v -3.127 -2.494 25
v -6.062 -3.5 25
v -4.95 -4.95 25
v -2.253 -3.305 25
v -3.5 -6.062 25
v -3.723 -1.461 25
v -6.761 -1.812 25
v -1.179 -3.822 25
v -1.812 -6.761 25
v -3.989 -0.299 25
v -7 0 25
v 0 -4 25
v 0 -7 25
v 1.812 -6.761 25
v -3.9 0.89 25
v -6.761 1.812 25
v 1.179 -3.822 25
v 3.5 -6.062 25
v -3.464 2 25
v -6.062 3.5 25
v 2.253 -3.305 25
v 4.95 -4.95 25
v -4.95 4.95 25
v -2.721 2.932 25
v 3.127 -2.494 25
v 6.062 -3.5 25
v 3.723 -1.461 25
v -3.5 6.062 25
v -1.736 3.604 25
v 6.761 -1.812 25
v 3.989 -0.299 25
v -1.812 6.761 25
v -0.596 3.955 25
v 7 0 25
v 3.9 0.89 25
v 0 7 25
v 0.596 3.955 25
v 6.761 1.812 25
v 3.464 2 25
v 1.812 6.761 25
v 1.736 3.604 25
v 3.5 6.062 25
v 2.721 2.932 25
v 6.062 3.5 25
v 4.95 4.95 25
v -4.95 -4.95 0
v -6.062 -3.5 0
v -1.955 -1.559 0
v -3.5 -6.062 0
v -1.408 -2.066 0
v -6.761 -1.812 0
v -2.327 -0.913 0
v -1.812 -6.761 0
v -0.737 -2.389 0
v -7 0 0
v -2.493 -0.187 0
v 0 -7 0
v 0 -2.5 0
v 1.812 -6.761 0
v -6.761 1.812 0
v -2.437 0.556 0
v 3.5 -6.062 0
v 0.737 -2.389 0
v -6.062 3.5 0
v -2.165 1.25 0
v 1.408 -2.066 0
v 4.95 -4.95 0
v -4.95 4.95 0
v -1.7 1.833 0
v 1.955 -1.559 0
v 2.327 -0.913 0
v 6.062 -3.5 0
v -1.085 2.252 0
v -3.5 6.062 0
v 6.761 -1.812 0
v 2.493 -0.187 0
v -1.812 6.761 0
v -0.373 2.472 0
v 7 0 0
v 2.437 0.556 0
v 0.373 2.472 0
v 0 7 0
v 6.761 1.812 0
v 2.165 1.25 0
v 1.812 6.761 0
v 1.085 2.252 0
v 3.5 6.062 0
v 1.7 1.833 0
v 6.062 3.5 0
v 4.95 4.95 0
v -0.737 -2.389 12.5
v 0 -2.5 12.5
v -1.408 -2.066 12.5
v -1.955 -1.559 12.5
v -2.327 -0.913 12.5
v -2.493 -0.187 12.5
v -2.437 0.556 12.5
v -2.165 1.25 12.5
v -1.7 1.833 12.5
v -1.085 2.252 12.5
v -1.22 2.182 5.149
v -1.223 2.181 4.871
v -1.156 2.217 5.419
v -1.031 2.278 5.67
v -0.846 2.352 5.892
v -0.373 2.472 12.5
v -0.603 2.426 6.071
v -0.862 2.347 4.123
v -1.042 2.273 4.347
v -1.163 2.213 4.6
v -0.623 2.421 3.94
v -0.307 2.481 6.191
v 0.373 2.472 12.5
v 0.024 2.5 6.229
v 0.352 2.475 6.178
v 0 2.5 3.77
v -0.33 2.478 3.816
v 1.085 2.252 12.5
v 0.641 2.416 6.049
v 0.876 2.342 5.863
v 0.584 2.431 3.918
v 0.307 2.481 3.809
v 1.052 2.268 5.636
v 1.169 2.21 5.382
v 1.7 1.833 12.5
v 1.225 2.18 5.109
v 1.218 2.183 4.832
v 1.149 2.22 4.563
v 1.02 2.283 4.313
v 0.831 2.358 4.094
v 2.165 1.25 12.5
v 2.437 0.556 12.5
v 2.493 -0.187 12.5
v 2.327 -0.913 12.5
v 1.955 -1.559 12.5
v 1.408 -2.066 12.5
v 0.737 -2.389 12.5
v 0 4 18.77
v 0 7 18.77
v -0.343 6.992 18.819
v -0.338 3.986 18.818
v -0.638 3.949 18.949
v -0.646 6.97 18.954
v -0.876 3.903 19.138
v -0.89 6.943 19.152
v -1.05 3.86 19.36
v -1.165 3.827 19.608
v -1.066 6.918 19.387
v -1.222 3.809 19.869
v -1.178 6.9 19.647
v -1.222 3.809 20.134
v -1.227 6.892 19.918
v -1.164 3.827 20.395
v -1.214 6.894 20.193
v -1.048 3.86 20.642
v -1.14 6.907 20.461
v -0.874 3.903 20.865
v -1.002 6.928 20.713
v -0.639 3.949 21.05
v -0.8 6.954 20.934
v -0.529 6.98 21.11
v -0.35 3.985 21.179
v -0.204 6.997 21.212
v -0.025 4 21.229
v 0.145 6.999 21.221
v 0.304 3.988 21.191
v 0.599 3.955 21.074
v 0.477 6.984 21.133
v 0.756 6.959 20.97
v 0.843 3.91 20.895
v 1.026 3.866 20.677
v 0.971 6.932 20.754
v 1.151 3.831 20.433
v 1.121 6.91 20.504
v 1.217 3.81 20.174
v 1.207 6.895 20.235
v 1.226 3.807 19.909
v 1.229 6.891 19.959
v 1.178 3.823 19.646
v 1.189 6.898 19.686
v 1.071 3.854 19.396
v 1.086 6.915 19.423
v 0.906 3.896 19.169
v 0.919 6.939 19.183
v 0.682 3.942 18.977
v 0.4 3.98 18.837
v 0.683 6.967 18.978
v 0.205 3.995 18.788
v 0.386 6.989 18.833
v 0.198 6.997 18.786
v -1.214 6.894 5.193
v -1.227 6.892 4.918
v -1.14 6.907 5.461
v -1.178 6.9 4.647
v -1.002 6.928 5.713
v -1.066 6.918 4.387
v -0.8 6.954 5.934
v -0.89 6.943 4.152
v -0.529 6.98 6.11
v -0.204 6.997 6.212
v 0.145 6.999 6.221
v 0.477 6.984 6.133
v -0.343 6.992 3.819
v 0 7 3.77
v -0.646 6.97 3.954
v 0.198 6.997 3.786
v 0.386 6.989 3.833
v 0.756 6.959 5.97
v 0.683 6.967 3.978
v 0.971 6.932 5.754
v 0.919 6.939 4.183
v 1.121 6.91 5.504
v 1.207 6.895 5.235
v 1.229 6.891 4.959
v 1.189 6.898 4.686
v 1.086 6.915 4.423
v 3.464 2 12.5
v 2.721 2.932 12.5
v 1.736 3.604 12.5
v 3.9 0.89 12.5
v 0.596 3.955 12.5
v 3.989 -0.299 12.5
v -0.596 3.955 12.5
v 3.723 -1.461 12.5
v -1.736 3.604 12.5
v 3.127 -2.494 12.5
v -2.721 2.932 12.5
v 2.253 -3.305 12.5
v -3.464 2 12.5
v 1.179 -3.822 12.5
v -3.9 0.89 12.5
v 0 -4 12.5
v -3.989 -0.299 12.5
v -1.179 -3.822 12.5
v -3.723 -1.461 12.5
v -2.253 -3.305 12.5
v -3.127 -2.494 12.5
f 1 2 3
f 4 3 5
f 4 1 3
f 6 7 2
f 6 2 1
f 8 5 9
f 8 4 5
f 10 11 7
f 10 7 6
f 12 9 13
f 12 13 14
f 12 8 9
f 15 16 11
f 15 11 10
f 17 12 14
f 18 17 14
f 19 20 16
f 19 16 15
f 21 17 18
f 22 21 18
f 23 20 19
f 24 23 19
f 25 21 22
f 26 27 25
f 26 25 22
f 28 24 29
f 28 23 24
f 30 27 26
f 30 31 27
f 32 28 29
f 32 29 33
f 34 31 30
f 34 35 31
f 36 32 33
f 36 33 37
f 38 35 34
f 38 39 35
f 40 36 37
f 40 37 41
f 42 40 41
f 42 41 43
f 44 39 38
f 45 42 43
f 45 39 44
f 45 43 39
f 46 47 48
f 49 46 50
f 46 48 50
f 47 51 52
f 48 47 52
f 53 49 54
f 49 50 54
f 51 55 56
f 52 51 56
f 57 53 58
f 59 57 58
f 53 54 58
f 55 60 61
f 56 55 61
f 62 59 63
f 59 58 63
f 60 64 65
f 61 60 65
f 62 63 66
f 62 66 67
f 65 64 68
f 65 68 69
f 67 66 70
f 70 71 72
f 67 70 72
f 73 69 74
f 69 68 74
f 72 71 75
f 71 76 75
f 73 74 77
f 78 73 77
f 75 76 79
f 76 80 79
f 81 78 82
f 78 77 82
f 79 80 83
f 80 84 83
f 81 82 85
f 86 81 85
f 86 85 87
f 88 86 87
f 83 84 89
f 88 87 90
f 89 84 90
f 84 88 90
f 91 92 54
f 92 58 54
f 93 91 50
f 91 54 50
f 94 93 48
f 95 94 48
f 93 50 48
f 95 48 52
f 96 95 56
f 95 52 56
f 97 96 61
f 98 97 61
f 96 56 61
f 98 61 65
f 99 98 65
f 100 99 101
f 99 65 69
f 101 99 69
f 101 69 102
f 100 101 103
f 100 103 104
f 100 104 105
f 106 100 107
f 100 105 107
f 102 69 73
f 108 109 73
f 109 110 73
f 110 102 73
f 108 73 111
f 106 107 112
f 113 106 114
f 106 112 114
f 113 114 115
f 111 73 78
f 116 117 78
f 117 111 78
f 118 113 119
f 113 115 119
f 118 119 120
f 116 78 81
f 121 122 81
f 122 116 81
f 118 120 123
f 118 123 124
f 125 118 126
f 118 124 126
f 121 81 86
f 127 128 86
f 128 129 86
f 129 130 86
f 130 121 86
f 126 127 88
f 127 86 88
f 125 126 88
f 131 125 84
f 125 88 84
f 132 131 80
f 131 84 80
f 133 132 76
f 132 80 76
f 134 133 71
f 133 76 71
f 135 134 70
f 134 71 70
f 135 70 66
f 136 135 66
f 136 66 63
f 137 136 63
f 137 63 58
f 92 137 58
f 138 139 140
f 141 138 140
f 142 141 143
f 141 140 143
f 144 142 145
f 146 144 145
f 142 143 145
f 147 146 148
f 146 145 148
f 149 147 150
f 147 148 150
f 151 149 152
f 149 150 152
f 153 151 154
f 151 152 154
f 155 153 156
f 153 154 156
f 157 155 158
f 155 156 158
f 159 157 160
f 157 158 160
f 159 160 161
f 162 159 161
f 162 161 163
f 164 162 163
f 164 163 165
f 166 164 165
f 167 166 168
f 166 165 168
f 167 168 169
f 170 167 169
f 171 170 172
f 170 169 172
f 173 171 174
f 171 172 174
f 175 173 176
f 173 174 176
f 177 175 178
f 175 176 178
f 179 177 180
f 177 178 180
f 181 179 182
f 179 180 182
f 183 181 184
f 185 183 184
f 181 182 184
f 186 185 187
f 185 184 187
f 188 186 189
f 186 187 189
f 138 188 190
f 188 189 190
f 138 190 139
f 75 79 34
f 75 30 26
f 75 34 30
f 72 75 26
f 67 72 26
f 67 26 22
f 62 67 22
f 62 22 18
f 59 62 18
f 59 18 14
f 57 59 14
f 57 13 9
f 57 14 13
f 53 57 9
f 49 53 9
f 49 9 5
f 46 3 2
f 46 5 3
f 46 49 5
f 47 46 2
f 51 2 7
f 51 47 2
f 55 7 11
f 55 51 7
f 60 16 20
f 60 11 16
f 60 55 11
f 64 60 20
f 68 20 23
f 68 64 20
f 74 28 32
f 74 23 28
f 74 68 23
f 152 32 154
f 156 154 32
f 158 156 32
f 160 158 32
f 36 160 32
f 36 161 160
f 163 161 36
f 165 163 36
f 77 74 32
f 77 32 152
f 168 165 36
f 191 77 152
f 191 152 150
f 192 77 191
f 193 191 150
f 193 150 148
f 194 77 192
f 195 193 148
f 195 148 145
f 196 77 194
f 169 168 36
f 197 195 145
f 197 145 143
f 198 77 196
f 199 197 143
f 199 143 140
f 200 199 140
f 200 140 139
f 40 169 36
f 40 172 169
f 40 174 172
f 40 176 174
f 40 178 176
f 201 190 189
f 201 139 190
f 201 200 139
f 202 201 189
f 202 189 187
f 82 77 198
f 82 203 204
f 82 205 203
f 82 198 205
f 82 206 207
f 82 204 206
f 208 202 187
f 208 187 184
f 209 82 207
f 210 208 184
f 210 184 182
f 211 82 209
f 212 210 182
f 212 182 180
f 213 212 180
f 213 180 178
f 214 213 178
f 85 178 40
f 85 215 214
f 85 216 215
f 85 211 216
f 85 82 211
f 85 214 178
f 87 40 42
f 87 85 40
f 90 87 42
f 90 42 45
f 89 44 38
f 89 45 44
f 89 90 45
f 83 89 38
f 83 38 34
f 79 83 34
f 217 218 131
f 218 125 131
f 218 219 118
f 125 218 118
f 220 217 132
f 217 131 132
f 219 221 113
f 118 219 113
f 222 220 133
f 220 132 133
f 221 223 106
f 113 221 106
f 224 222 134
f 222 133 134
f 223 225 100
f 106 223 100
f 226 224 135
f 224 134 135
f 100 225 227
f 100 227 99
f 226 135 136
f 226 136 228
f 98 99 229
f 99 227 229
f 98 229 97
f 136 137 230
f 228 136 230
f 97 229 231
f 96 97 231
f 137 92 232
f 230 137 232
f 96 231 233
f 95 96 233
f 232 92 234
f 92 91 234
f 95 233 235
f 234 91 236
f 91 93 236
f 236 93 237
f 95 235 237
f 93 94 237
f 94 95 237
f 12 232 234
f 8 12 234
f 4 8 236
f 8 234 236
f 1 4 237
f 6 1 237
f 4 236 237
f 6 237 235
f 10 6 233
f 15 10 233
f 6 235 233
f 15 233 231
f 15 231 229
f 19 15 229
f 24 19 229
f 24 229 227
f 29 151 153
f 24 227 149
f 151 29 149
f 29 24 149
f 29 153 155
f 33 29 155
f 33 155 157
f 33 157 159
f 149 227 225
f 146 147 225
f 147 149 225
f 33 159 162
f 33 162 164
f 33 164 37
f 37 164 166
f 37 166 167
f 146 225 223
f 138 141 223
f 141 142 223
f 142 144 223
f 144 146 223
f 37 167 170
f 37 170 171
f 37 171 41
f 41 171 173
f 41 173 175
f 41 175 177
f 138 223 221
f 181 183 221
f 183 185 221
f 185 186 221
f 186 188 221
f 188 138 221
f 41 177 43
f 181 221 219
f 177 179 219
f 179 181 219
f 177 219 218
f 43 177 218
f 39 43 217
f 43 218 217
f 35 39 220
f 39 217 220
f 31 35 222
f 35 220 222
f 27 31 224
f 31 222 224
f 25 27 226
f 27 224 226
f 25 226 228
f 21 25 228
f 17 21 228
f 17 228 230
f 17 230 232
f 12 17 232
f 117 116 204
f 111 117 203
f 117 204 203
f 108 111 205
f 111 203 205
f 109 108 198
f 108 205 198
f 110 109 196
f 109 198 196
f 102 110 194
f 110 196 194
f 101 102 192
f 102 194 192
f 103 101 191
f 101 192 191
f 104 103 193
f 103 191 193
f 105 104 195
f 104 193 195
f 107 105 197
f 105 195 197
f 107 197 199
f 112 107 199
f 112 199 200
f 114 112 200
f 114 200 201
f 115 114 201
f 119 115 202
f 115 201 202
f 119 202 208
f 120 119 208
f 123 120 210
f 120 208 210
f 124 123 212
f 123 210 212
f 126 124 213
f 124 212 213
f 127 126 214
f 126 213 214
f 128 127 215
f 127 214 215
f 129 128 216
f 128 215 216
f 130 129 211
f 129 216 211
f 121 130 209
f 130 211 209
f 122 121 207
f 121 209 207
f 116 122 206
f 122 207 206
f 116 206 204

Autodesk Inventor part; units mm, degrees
ref_plane "YZ Plane" through (0, 0, 0) normal (1, 0, 0) x (0, 1, 0)
ref_plane "XZ Plane" through (0, 0, 0) normal (0, 1, 0) x (-1, 0, 0)
ref_plane "XY Plane" through (0, 0, 0) normal (0, 0, 1) x (1, 0, 0)
sketch "Sketch1" plane through (0, 0, 0) normal (0, 0, 1) x (1, 0, 0)
  circle A0 centre (0, 0) radius 7
  dimension "d0" = 14
extrude "Extrusion1" add sketch "Sketch1" along normal blind 25
sketch "Sketch3" plane through (0, 0, 25) normal (0, 0, 1) x (1, 0, 0)
  circle A0 centre (0, 0) radius 7 projected
hole "Hole1" at (0, 0, 25) direction (0, 0, -1) diameter 5 end through all counterbore diameter 8 counterbore depth 12.5
sketch "Sketch4" plane through (0, 0, 0) normal (0, 1, 0) x (-1, 0, 0)
  line L0 (7, 25) -> (-7, 25) projected
  line L1 (7, 0) -> (-7, 0) projected
  point P0 (0, 0)
  point P1 (0, 20)
  point P2 (0, 5)
  dimension "d10" = 5
  dimension "d11" = 5
hole "Hole2" at (0, 0, 20) at (0, 0, 5) direction (0, 1, 0) diameter 2.459 depth 8.8 tip angle 118 thread size "M3x0.5" class "6H" standard "ISO Metric profile"
properties part number "10-03-05 Hub"
